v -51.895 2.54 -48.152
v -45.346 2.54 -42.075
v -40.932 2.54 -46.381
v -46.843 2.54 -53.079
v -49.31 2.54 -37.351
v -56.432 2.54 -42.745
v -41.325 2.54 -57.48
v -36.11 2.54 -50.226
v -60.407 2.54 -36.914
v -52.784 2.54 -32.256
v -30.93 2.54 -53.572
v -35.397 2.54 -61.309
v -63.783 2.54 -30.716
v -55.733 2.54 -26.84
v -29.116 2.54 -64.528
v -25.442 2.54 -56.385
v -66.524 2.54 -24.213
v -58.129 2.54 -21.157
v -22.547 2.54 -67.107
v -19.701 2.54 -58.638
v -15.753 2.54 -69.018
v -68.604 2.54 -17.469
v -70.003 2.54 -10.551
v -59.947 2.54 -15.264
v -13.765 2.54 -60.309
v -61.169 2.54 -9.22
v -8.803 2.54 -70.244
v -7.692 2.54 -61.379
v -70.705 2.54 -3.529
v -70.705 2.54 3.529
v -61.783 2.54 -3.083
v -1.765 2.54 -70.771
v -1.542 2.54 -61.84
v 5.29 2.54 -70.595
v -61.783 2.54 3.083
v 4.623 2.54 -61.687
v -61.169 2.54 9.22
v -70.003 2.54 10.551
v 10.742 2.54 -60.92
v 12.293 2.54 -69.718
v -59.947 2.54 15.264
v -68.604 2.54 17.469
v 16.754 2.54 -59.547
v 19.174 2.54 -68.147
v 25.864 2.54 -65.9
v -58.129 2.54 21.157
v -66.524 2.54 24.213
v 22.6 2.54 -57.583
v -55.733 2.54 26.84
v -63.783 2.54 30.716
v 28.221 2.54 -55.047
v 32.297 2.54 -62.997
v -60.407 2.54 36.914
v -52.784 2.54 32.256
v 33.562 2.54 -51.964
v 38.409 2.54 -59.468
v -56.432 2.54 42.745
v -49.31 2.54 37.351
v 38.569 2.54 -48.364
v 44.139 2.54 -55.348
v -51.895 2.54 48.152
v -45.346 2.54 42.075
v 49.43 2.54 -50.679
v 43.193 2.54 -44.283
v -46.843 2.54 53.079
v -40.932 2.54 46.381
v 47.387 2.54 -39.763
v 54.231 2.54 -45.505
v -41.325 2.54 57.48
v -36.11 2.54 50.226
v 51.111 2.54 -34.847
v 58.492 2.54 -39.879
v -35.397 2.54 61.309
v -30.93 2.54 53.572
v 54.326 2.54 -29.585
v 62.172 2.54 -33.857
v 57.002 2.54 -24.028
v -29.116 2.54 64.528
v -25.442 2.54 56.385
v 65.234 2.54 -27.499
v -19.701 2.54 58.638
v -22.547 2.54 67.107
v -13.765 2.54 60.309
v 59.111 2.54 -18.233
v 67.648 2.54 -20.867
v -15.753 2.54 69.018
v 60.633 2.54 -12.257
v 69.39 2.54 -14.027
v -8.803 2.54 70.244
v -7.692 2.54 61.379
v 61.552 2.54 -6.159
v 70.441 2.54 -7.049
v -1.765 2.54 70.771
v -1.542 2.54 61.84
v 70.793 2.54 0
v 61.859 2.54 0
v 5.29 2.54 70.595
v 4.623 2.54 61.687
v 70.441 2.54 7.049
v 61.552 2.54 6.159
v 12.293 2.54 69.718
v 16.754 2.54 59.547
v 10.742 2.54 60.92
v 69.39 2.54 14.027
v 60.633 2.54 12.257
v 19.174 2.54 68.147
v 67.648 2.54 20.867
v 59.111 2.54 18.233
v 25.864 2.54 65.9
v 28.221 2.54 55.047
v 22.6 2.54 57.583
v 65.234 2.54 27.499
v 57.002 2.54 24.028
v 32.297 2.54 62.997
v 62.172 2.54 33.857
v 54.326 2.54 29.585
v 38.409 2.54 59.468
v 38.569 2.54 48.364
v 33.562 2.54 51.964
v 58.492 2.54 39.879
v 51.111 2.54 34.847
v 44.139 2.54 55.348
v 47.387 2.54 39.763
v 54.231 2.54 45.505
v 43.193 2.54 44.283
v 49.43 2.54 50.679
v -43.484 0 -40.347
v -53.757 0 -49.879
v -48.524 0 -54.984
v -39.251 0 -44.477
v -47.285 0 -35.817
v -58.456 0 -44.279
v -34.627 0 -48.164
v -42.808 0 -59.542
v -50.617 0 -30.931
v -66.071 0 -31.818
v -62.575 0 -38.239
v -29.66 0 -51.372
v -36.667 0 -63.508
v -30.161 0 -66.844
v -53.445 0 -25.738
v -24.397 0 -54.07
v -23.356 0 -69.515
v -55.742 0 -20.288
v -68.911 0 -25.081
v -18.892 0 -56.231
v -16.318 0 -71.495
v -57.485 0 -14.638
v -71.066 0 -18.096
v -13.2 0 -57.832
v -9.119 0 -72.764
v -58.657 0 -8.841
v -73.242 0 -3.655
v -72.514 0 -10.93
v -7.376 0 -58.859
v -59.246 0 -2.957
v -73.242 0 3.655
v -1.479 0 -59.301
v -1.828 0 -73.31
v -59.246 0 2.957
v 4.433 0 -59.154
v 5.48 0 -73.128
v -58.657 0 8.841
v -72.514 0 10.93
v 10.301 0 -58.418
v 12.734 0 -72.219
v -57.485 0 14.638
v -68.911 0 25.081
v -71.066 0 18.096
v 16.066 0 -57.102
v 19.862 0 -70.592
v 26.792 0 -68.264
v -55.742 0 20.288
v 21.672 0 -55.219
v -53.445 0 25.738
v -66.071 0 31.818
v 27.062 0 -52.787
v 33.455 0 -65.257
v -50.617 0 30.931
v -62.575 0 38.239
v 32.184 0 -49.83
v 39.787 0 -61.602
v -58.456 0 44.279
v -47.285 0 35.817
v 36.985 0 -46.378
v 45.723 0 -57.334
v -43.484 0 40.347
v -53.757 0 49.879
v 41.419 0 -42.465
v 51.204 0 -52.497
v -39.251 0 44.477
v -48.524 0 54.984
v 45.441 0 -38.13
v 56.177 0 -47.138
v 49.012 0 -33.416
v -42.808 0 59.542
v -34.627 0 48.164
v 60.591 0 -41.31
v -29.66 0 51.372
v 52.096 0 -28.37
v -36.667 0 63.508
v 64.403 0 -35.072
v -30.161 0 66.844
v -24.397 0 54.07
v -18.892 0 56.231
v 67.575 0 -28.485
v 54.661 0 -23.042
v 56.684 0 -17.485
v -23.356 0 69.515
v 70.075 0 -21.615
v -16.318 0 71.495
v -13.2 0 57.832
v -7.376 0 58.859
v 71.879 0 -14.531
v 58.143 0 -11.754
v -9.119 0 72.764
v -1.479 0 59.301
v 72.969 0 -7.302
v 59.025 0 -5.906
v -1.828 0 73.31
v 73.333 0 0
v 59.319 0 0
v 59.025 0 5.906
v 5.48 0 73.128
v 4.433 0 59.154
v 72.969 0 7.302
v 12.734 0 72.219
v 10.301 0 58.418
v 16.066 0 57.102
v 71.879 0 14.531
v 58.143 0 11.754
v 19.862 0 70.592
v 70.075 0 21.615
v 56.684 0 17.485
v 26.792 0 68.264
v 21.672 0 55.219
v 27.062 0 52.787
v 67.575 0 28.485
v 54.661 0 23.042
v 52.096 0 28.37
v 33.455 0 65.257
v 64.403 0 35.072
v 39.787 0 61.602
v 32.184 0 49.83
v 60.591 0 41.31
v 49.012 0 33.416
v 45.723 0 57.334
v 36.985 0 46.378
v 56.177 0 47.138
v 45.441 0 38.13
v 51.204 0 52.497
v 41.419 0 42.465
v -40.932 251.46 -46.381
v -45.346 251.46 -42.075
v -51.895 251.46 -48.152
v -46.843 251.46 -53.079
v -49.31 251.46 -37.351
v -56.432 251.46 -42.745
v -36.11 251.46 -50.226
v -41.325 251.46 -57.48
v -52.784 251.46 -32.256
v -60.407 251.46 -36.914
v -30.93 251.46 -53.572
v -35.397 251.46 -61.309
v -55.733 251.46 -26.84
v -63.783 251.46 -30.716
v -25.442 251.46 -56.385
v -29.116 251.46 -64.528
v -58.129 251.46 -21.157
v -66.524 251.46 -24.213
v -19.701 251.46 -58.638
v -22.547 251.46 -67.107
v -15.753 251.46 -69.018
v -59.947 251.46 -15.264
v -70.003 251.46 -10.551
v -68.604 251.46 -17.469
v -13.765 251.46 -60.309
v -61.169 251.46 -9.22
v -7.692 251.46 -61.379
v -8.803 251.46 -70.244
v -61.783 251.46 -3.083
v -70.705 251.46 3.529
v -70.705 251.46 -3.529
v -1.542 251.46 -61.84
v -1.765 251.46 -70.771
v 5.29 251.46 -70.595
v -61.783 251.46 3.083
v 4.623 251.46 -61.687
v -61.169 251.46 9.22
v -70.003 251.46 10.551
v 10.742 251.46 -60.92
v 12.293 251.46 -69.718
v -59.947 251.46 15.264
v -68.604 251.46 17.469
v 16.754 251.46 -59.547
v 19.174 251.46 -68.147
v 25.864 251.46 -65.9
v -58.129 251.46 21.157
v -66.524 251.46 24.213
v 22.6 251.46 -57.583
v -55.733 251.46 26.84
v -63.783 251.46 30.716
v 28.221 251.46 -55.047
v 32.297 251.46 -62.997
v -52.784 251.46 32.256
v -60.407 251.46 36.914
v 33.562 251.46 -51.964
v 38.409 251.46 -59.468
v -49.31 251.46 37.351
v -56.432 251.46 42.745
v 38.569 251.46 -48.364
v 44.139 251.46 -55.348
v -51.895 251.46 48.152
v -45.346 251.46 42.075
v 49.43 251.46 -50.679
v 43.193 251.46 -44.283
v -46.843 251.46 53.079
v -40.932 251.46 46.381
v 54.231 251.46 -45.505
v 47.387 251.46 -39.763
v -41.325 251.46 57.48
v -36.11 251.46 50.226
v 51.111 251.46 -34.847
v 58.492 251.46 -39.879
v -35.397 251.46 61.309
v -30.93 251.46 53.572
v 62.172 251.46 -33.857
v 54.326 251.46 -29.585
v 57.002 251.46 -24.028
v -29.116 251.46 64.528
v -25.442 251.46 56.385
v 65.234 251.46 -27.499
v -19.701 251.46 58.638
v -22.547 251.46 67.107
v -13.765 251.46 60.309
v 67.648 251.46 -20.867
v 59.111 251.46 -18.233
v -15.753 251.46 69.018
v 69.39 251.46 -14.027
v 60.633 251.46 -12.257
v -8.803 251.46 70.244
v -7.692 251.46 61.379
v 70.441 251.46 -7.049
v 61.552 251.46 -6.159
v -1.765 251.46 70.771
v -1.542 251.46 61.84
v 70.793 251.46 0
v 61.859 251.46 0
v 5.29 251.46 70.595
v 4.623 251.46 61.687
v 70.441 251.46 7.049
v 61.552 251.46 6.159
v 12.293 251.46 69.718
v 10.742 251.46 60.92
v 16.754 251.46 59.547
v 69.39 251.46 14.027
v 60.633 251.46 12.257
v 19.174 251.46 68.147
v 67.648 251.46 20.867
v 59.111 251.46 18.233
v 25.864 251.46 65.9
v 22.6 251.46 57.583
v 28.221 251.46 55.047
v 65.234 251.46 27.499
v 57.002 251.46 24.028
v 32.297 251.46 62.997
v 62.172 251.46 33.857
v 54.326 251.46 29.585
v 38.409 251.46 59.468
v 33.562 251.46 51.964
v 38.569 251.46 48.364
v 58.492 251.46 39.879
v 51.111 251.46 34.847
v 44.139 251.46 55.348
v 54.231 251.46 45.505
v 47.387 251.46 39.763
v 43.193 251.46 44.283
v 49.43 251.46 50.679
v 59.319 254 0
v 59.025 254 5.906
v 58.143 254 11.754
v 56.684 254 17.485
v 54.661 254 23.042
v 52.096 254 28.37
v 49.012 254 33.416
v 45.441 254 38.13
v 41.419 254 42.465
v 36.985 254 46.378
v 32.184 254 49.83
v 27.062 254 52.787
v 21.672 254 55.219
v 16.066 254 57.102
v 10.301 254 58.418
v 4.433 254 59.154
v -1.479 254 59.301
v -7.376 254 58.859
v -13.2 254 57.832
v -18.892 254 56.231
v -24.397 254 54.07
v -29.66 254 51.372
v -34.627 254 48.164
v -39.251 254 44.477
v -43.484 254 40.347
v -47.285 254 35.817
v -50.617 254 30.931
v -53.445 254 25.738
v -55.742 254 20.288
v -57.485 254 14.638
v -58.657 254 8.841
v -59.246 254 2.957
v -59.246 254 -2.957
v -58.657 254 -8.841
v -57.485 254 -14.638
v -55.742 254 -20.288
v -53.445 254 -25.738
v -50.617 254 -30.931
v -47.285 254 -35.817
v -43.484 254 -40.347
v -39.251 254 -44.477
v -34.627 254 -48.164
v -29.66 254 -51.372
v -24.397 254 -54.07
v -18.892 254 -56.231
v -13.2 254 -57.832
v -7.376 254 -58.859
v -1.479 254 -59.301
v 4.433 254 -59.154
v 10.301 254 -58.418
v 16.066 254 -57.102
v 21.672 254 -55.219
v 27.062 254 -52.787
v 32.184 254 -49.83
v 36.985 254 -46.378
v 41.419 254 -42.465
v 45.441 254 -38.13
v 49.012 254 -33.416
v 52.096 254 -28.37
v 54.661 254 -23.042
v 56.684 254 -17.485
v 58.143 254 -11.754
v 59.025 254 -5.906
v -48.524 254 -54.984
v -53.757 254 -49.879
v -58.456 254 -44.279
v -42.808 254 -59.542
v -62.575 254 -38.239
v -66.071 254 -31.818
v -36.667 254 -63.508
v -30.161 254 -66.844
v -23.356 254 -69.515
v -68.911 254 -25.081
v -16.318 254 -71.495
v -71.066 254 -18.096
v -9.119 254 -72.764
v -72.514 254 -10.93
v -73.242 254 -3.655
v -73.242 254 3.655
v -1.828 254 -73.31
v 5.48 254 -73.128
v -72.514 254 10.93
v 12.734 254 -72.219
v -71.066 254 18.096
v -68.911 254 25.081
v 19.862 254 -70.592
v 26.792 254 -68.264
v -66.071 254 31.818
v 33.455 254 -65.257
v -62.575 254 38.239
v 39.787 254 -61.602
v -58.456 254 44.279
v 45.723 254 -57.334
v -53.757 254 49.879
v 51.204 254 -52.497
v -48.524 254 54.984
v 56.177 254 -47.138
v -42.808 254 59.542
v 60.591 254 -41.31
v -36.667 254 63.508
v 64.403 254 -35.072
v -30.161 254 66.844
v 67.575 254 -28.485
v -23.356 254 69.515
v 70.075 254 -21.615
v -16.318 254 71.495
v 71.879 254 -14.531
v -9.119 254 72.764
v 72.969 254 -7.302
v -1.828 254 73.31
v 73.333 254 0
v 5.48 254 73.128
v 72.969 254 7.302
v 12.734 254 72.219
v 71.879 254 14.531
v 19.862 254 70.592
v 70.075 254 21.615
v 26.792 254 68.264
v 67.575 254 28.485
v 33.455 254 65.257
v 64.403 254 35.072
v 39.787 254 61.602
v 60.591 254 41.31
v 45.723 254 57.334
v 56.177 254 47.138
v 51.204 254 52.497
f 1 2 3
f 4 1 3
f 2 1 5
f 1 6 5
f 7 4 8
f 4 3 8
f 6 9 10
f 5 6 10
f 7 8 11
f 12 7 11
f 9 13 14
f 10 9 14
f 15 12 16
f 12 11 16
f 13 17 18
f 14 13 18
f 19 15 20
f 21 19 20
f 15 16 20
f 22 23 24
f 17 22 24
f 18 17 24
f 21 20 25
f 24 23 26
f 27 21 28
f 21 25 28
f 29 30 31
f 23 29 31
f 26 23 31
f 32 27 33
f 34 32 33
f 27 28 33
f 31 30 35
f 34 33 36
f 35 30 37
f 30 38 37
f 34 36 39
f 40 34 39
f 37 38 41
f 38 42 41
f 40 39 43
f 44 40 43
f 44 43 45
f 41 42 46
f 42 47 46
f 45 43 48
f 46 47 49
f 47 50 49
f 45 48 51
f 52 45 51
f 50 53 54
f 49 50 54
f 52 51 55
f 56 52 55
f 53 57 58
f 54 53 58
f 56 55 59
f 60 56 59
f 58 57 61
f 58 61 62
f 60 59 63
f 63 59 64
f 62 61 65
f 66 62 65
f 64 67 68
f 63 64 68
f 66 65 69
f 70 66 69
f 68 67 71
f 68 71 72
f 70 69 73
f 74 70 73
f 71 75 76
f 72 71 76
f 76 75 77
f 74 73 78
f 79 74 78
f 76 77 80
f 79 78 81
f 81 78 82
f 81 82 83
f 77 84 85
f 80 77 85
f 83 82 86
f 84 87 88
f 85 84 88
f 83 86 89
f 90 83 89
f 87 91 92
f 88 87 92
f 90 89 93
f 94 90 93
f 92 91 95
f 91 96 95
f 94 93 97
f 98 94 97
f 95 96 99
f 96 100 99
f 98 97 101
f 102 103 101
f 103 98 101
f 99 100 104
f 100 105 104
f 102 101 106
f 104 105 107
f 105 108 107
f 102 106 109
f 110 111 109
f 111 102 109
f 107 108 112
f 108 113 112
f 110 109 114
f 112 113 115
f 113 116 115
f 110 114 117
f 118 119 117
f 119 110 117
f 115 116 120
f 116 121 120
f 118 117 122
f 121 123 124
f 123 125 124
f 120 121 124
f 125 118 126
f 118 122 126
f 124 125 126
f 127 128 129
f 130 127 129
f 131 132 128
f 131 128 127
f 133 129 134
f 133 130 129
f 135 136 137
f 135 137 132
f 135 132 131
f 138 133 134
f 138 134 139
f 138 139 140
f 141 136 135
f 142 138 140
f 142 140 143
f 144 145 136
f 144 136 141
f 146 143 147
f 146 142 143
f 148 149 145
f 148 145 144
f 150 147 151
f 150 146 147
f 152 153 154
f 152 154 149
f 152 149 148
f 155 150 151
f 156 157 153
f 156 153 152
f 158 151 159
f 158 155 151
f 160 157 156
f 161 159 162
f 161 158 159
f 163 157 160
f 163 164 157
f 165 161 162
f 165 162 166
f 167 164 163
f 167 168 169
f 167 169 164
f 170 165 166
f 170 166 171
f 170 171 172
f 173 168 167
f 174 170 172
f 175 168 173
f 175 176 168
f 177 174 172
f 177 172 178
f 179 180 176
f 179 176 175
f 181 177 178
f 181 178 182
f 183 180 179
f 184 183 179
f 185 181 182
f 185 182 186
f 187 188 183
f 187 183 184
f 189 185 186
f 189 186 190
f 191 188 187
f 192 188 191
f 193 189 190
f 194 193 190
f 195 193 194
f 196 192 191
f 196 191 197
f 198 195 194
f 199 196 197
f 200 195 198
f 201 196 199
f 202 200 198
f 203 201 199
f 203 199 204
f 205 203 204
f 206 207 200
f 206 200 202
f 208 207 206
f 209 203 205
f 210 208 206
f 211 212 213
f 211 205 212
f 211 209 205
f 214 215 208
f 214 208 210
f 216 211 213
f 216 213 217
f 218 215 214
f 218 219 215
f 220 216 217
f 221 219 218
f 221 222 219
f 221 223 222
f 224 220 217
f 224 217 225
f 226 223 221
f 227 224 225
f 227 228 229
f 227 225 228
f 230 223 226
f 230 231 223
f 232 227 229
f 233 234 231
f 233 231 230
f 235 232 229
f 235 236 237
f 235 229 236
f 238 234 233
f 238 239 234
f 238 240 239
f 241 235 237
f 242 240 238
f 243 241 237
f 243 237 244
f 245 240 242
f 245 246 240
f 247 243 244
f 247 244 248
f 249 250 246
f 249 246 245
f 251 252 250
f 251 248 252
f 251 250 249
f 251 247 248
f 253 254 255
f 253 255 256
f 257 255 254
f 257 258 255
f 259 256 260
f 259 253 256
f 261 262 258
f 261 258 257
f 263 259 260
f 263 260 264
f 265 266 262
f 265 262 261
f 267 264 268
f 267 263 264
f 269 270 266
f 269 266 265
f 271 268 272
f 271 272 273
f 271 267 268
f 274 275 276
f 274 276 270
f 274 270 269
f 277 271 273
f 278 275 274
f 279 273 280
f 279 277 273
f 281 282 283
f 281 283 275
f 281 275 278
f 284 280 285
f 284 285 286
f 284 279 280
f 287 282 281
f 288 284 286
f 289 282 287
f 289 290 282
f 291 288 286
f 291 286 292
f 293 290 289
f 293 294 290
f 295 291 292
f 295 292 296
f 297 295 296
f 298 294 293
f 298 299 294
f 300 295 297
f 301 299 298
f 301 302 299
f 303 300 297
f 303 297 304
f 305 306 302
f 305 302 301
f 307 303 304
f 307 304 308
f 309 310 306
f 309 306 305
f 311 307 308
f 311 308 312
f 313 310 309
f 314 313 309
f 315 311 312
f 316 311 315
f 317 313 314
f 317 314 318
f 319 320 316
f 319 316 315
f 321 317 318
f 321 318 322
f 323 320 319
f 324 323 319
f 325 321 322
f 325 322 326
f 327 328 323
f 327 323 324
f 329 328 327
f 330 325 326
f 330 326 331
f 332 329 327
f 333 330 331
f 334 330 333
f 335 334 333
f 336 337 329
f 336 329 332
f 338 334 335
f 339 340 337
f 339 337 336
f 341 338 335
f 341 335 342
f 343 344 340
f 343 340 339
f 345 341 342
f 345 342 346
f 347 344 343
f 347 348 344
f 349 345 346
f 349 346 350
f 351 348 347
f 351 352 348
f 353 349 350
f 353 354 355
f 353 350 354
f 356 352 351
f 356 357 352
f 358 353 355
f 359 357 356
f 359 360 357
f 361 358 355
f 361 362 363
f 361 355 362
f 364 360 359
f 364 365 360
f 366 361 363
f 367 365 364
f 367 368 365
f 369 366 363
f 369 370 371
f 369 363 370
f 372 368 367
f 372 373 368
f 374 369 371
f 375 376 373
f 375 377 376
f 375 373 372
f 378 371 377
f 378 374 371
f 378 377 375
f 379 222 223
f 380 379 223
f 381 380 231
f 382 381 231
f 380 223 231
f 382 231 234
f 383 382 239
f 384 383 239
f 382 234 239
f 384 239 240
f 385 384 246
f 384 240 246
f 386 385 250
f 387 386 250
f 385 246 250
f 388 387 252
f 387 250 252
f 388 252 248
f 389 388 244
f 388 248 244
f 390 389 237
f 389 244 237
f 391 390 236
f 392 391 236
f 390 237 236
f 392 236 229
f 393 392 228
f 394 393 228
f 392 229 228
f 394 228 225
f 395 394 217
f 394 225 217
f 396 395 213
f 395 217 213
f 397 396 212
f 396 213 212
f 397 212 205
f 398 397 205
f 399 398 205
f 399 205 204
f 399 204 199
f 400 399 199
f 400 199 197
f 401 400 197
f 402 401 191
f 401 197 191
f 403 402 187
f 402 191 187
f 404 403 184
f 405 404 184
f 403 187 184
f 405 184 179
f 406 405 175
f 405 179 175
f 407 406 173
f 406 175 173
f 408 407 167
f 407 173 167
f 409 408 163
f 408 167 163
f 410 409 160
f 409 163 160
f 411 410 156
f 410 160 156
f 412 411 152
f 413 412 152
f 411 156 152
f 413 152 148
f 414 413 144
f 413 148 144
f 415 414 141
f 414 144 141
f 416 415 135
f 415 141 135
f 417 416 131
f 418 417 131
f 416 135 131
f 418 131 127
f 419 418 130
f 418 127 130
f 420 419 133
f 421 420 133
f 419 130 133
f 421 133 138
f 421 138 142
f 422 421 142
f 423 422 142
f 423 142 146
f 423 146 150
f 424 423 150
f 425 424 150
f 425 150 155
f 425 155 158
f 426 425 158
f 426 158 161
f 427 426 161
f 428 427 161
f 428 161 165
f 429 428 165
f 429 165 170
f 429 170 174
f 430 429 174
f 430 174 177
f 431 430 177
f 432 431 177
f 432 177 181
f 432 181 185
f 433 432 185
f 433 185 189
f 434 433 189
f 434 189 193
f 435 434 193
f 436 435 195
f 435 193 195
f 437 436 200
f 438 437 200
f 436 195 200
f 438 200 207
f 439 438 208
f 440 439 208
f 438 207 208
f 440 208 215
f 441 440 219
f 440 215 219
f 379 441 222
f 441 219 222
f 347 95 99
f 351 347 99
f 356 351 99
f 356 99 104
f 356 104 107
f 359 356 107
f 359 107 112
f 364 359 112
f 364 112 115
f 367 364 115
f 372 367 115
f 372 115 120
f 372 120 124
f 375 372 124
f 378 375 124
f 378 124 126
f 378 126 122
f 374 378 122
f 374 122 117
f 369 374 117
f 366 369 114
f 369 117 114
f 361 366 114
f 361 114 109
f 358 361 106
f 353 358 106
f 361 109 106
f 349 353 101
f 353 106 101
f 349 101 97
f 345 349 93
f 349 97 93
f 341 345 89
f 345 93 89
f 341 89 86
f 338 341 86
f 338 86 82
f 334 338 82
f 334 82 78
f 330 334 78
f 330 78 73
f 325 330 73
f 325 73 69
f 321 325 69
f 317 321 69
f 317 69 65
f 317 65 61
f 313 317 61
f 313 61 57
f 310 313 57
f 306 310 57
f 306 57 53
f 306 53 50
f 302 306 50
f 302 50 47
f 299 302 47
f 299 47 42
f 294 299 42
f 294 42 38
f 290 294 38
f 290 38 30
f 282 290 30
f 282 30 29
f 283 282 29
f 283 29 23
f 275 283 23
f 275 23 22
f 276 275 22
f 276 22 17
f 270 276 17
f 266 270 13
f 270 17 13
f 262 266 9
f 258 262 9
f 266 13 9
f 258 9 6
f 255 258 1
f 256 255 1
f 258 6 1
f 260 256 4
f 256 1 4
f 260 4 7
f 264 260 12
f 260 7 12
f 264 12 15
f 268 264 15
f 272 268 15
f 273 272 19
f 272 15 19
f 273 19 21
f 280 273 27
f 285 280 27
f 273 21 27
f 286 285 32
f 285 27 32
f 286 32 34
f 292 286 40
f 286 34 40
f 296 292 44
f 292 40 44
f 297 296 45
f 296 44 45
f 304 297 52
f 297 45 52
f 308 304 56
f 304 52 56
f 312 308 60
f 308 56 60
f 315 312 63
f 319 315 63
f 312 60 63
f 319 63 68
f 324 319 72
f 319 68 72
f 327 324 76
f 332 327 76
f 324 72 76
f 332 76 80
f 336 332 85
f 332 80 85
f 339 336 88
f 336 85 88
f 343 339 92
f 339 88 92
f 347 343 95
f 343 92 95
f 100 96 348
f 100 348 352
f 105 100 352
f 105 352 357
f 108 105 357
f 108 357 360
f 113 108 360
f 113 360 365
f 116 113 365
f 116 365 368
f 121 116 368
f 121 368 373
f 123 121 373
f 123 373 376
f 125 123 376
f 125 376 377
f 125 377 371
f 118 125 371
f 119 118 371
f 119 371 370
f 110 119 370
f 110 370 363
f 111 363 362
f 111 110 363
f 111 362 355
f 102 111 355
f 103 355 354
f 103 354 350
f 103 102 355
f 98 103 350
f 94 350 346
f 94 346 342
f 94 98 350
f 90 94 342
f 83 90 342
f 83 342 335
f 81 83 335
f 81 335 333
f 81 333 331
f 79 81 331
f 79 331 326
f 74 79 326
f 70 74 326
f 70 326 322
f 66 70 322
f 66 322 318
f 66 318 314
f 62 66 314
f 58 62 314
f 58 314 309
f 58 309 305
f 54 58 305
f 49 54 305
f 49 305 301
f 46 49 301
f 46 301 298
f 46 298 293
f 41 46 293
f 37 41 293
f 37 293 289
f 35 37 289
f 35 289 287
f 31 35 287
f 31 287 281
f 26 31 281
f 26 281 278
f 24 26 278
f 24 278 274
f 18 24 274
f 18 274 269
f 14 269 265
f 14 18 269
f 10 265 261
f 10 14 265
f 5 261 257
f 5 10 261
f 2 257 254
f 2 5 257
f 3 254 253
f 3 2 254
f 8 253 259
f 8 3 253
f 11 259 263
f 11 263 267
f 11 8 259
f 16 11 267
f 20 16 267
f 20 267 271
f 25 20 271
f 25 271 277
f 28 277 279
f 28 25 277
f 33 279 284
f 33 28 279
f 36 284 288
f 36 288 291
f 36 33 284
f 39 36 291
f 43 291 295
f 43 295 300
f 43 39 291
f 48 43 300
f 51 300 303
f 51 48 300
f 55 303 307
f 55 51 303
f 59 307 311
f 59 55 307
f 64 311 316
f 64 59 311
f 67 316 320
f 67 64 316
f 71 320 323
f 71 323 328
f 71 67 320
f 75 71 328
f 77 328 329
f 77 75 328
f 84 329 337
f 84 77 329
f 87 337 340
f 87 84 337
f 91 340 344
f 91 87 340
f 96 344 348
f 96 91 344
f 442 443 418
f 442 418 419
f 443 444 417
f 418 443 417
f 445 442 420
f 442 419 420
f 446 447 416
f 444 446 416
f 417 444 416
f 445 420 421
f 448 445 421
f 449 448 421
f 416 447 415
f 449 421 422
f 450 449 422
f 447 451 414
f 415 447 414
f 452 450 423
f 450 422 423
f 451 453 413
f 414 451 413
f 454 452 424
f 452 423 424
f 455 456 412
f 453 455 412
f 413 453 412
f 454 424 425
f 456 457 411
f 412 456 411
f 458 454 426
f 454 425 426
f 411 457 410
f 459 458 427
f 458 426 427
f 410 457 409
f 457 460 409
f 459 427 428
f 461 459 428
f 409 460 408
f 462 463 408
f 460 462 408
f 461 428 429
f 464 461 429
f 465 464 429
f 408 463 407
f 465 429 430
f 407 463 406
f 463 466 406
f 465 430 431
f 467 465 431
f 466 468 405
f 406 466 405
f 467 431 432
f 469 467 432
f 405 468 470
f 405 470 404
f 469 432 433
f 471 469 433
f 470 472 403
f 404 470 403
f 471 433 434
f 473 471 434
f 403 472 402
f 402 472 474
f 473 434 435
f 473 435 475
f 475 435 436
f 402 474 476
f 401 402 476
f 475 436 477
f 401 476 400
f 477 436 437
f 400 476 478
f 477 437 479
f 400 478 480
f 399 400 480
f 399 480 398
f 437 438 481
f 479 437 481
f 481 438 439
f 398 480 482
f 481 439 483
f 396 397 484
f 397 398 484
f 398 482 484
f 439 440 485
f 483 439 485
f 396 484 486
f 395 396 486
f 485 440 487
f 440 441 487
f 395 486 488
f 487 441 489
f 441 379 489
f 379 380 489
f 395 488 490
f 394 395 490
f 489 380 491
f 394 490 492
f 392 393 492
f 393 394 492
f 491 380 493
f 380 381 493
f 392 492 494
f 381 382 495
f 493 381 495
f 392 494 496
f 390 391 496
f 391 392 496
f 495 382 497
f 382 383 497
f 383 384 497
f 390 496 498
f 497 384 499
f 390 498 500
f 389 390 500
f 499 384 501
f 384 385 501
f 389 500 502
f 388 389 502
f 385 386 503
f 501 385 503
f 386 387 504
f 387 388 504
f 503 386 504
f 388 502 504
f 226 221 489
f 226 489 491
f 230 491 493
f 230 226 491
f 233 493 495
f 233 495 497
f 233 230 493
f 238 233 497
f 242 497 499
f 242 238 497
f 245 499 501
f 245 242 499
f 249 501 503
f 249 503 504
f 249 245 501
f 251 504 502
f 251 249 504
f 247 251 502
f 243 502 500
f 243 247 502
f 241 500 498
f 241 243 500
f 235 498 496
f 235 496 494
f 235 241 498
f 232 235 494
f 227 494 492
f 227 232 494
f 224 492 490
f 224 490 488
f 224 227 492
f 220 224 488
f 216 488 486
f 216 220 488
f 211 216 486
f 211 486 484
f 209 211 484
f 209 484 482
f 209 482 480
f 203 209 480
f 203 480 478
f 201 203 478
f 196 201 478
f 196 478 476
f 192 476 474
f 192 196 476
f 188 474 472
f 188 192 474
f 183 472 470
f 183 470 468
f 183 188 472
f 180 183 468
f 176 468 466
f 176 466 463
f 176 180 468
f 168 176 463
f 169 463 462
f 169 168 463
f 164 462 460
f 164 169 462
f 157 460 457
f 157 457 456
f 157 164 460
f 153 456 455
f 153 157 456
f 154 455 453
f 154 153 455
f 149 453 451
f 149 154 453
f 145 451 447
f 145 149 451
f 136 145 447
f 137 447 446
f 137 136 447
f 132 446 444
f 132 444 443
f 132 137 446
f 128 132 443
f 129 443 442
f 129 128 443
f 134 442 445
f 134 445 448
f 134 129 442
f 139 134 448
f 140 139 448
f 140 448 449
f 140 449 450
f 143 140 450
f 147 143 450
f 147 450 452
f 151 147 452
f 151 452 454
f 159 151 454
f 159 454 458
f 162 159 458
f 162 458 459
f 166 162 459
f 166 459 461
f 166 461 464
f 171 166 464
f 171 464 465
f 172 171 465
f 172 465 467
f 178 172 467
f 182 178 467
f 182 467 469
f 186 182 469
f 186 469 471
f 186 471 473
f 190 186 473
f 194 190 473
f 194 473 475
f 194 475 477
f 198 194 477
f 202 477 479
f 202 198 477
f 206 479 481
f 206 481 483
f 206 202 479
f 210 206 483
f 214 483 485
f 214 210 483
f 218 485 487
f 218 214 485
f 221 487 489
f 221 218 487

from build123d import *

# Parameters (mm, degrees)
F0_R     = 73.3332365525
F0_R_2   = 59.319487814
F1_DEPTH = 254
F2_T     = -2.54


with BuildPart() as f1:
    # F0 (on Front) → F1 (new body)
    with BuildSketch(Plane.XZ):
        Circle(F0_R)
        Circle(F0_R_2, mode=Mode.SUBTRACT)
    extrude(amount=-F1_DEPTH)

    # F2 (hollow: no face is removed)
    offset(amount=F2_T, mode=Mode.SUBTRACT)


solid = f1.part
